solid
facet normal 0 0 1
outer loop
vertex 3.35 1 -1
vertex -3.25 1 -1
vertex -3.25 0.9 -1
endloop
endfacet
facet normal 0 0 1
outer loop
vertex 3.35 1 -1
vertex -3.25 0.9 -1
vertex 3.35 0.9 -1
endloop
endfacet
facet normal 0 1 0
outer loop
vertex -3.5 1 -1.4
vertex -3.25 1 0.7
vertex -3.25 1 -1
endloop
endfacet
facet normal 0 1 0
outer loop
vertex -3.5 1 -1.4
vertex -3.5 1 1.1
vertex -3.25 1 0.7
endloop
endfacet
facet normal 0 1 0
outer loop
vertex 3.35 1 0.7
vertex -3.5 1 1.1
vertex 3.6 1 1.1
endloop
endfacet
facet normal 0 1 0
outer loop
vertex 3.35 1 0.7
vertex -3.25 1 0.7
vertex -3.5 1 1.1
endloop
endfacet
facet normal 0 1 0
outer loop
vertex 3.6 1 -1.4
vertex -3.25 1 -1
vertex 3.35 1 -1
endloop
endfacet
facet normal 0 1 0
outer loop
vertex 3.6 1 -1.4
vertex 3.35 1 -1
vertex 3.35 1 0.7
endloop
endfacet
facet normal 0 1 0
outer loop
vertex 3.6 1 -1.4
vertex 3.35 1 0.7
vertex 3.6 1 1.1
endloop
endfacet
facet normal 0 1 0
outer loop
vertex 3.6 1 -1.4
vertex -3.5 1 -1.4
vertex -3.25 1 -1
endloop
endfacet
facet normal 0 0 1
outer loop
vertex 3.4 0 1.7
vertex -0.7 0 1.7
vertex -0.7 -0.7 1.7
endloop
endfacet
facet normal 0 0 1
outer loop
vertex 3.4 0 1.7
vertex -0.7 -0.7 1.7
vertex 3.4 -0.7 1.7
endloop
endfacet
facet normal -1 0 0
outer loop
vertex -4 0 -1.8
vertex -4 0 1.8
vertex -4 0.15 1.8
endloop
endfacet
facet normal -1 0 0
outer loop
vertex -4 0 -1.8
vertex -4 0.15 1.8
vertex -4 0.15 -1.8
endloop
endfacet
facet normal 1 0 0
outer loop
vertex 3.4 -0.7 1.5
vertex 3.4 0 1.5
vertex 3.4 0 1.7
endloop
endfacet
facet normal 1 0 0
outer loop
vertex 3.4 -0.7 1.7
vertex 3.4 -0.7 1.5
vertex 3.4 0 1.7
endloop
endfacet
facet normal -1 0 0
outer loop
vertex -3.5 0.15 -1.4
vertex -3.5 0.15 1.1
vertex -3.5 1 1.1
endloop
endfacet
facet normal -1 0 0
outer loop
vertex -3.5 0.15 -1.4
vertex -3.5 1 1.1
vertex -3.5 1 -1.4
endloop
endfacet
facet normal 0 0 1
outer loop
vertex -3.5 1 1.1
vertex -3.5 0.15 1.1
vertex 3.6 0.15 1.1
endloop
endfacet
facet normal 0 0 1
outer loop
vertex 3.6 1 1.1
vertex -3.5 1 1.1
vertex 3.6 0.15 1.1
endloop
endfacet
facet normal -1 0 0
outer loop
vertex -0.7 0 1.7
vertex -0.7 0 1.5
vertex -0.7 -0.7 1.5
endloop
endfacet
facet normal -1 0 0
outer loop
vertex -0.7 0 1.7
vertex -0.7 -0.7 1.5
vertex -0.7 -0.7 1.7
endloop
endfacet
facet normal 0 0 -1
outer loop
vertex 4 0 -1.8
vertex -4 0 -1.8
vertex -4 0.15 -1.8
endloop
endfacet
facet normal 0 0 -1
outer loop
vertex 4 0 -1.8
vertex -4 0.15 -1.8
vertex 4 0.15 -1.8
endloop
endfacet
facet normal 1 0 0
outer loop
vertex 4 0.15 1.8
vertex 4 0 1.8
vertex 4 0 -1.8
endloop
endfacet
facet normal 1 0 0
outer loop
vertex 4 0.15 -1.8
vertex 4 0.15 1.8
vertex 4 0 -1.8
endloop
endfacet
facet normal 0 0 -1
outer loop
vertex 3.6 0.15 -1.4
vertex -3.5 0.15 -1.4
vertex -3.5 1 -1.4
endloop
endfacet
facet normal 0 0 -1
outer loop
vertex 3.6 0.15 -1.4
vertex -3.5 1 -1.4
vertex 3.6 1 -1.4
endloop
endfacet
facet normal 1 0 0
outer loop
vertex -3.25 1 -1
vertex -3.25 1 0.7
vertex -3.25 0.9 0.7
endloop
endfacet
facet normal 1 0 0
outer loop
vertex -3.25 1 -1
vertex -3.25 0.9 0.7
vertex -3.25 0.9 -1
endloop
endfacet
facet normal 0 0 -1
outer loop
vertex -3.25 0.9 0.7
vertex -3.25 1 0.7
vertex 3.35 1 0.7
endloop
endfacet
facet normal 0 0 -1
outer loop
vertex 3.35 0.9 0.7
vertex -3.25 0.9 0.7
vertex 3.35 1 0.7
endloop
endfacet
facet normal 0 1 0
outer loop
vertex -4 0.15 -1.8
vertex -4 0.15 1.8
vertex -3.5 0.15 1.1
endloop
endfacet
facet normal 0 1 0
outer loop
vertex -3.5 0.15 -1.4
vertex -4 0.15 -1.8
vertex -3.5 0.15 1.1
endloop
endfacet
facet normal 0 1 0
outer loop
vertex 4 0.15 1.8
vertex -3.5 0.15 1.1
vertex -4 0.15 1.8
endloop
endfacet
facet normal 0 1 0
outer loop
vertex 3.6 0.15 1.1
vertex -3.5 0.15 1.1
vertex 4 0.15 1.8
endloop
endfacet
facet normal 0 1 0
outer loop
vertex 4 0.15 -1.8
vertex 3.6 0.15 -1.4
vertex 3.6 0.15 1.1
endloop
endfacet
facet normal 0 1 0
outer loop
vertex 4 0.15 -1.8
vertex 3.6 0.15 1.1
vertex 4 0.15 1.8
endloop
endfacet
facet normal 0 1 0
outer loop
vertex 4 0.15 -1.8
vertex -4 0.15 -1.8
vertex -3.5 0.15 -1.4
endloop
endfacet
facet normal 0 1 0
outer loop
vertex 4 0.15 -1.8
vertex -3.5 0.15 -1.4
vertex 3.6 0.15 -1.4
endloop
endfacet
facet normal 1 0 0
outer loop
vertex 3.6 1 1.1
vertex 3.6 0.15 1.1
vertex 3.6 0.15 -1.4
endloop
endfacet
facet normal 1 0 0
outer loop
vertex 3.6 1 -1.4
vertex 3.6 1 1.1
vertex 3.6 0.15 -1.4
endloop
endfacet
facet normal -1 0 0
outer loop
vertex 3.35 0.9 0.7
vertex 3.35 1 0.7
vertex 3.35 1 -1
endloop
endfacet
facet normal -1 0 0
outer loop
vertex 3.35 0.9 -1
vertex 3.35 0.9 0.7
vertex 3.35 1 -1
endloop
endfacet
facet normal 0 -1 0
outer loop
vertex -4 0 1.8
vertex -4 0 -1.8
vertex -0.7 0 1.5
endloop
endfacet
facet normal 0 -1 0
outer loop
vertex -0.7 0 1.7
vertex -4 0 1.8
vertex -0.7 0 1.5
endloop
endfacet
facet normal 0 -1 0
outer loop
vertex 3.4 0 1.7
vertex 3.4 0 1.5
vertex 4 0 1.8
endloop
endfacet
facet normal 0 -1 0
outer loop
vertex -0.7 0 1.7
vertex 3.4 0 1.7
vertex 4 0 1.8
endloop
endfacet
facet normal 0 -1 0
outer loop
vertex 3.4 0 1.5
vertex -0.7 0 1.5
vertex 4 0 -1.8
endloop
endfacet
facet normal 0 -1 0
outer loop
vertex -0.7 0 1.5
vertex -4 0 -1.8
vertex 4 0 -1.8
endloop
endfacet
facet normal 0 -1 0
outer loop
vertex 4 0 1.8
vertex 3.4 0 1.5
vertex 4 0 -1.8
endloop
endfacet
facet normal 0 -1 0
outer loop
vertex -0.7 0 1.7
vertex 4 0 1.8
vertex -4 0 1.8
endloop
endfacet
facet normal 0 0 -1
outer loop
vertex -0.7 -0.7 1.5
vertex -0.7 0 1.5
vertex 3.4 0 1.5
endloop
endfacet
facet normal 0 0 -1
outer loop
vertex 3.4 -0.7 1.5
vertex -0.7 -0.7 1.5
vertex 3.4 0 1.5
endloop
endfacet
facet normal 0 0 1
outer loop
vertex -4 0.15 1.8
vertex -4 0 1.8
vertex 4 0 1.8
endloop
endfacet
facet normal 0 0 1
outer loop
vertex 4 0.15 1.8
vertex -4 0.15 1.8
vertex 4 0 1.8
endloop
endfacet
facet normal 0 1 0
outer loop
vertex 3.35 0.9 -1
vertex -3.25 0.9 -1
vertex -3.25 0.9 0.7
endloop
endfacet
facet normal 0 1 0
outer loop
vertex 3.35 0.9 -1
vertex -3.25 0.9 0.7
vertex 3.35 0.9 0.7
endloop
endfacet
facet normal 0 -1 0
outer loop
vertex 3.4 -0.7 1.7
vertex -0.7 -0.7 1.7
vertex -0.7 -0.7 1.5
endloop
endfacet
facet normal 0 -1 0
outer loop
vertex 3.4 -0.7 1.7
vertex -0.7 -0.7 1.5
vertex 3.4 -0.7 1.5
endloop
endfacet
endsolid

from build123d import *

# Parameters (mm, degrees)
ESQUISSE1_W             = 8
ESQUISSE1_H             = 3.6
BOSS_EXTRU_1_DEPTH      = 0.15
ESQUISSE2_W             = 7.1
ESQUISSE2_H             = 2.5
BOSS_EXTRU_2_DEPTH      = 0.85
ESQUISSE3_W             = 4.1
ESQUISSE3_H             = 0.2
BOSS_EXTRU_3_DEPTH      = 0.7
ESQUISSE4_W             = 6.6
ESQUISSE4_H             = 1.7
ENL_V_MAT_EXTRU_1_DEPTH = 0.1


with BuildPart() as part:
    # Esquisse1 → Boss.-Extru.1 (new body)
    with BuildSketch(Plane(origin=(0, 0, 0), x_dir=(1, 0, 0), z_dir=(0, 1, 0))):
        Rectangle(ESQUISSE1_W, ESQUISSE1_H)
    extrude(amount=BOSS_EXTRU_1_DEPTH)

    # Esquisse2 → Boss.-Extru.2 (add)
    with BuildSketch(Plane(origin=(0, 0.15, 0), x_dir=(1, 0, 0), z_dir=(0, 1, 0))):
        with Locations((0.05, 0.15)):
            Rectangle(ESQUISSE2_W, ESQUISSE2_H)
    extrude(amount=BOSS_EXTRU_2_DEPTH)

    # Esquisse3 → Boss.-Extru.3 (add)
    with BuildSketch(Plane.XZ):
        with Locations((1.35, 1.6)):
            Rectangle(ESQUISSE3_W, ESQUISSE3_H)
    extrude(amount=BOSS_EXTRU_3_DEPTH)

    # Esquisse4 → Enlèv. mat.-Extru.1 (cut)
    with BuildSketch(Plane(origin=(0, 1, 0), x_dir=(1, 0, 0), z_dir=(0, 1, 0))):
        with Locations((0.05, 0.15)):
            Rectangle(ESQUISSE4_W, ESQUISSE4_H)
    extrude(amount=-ENL_V_MAT_EXTRU_1_DEPTH, mode=Mode.SUBTRACT)


solid = part.part
